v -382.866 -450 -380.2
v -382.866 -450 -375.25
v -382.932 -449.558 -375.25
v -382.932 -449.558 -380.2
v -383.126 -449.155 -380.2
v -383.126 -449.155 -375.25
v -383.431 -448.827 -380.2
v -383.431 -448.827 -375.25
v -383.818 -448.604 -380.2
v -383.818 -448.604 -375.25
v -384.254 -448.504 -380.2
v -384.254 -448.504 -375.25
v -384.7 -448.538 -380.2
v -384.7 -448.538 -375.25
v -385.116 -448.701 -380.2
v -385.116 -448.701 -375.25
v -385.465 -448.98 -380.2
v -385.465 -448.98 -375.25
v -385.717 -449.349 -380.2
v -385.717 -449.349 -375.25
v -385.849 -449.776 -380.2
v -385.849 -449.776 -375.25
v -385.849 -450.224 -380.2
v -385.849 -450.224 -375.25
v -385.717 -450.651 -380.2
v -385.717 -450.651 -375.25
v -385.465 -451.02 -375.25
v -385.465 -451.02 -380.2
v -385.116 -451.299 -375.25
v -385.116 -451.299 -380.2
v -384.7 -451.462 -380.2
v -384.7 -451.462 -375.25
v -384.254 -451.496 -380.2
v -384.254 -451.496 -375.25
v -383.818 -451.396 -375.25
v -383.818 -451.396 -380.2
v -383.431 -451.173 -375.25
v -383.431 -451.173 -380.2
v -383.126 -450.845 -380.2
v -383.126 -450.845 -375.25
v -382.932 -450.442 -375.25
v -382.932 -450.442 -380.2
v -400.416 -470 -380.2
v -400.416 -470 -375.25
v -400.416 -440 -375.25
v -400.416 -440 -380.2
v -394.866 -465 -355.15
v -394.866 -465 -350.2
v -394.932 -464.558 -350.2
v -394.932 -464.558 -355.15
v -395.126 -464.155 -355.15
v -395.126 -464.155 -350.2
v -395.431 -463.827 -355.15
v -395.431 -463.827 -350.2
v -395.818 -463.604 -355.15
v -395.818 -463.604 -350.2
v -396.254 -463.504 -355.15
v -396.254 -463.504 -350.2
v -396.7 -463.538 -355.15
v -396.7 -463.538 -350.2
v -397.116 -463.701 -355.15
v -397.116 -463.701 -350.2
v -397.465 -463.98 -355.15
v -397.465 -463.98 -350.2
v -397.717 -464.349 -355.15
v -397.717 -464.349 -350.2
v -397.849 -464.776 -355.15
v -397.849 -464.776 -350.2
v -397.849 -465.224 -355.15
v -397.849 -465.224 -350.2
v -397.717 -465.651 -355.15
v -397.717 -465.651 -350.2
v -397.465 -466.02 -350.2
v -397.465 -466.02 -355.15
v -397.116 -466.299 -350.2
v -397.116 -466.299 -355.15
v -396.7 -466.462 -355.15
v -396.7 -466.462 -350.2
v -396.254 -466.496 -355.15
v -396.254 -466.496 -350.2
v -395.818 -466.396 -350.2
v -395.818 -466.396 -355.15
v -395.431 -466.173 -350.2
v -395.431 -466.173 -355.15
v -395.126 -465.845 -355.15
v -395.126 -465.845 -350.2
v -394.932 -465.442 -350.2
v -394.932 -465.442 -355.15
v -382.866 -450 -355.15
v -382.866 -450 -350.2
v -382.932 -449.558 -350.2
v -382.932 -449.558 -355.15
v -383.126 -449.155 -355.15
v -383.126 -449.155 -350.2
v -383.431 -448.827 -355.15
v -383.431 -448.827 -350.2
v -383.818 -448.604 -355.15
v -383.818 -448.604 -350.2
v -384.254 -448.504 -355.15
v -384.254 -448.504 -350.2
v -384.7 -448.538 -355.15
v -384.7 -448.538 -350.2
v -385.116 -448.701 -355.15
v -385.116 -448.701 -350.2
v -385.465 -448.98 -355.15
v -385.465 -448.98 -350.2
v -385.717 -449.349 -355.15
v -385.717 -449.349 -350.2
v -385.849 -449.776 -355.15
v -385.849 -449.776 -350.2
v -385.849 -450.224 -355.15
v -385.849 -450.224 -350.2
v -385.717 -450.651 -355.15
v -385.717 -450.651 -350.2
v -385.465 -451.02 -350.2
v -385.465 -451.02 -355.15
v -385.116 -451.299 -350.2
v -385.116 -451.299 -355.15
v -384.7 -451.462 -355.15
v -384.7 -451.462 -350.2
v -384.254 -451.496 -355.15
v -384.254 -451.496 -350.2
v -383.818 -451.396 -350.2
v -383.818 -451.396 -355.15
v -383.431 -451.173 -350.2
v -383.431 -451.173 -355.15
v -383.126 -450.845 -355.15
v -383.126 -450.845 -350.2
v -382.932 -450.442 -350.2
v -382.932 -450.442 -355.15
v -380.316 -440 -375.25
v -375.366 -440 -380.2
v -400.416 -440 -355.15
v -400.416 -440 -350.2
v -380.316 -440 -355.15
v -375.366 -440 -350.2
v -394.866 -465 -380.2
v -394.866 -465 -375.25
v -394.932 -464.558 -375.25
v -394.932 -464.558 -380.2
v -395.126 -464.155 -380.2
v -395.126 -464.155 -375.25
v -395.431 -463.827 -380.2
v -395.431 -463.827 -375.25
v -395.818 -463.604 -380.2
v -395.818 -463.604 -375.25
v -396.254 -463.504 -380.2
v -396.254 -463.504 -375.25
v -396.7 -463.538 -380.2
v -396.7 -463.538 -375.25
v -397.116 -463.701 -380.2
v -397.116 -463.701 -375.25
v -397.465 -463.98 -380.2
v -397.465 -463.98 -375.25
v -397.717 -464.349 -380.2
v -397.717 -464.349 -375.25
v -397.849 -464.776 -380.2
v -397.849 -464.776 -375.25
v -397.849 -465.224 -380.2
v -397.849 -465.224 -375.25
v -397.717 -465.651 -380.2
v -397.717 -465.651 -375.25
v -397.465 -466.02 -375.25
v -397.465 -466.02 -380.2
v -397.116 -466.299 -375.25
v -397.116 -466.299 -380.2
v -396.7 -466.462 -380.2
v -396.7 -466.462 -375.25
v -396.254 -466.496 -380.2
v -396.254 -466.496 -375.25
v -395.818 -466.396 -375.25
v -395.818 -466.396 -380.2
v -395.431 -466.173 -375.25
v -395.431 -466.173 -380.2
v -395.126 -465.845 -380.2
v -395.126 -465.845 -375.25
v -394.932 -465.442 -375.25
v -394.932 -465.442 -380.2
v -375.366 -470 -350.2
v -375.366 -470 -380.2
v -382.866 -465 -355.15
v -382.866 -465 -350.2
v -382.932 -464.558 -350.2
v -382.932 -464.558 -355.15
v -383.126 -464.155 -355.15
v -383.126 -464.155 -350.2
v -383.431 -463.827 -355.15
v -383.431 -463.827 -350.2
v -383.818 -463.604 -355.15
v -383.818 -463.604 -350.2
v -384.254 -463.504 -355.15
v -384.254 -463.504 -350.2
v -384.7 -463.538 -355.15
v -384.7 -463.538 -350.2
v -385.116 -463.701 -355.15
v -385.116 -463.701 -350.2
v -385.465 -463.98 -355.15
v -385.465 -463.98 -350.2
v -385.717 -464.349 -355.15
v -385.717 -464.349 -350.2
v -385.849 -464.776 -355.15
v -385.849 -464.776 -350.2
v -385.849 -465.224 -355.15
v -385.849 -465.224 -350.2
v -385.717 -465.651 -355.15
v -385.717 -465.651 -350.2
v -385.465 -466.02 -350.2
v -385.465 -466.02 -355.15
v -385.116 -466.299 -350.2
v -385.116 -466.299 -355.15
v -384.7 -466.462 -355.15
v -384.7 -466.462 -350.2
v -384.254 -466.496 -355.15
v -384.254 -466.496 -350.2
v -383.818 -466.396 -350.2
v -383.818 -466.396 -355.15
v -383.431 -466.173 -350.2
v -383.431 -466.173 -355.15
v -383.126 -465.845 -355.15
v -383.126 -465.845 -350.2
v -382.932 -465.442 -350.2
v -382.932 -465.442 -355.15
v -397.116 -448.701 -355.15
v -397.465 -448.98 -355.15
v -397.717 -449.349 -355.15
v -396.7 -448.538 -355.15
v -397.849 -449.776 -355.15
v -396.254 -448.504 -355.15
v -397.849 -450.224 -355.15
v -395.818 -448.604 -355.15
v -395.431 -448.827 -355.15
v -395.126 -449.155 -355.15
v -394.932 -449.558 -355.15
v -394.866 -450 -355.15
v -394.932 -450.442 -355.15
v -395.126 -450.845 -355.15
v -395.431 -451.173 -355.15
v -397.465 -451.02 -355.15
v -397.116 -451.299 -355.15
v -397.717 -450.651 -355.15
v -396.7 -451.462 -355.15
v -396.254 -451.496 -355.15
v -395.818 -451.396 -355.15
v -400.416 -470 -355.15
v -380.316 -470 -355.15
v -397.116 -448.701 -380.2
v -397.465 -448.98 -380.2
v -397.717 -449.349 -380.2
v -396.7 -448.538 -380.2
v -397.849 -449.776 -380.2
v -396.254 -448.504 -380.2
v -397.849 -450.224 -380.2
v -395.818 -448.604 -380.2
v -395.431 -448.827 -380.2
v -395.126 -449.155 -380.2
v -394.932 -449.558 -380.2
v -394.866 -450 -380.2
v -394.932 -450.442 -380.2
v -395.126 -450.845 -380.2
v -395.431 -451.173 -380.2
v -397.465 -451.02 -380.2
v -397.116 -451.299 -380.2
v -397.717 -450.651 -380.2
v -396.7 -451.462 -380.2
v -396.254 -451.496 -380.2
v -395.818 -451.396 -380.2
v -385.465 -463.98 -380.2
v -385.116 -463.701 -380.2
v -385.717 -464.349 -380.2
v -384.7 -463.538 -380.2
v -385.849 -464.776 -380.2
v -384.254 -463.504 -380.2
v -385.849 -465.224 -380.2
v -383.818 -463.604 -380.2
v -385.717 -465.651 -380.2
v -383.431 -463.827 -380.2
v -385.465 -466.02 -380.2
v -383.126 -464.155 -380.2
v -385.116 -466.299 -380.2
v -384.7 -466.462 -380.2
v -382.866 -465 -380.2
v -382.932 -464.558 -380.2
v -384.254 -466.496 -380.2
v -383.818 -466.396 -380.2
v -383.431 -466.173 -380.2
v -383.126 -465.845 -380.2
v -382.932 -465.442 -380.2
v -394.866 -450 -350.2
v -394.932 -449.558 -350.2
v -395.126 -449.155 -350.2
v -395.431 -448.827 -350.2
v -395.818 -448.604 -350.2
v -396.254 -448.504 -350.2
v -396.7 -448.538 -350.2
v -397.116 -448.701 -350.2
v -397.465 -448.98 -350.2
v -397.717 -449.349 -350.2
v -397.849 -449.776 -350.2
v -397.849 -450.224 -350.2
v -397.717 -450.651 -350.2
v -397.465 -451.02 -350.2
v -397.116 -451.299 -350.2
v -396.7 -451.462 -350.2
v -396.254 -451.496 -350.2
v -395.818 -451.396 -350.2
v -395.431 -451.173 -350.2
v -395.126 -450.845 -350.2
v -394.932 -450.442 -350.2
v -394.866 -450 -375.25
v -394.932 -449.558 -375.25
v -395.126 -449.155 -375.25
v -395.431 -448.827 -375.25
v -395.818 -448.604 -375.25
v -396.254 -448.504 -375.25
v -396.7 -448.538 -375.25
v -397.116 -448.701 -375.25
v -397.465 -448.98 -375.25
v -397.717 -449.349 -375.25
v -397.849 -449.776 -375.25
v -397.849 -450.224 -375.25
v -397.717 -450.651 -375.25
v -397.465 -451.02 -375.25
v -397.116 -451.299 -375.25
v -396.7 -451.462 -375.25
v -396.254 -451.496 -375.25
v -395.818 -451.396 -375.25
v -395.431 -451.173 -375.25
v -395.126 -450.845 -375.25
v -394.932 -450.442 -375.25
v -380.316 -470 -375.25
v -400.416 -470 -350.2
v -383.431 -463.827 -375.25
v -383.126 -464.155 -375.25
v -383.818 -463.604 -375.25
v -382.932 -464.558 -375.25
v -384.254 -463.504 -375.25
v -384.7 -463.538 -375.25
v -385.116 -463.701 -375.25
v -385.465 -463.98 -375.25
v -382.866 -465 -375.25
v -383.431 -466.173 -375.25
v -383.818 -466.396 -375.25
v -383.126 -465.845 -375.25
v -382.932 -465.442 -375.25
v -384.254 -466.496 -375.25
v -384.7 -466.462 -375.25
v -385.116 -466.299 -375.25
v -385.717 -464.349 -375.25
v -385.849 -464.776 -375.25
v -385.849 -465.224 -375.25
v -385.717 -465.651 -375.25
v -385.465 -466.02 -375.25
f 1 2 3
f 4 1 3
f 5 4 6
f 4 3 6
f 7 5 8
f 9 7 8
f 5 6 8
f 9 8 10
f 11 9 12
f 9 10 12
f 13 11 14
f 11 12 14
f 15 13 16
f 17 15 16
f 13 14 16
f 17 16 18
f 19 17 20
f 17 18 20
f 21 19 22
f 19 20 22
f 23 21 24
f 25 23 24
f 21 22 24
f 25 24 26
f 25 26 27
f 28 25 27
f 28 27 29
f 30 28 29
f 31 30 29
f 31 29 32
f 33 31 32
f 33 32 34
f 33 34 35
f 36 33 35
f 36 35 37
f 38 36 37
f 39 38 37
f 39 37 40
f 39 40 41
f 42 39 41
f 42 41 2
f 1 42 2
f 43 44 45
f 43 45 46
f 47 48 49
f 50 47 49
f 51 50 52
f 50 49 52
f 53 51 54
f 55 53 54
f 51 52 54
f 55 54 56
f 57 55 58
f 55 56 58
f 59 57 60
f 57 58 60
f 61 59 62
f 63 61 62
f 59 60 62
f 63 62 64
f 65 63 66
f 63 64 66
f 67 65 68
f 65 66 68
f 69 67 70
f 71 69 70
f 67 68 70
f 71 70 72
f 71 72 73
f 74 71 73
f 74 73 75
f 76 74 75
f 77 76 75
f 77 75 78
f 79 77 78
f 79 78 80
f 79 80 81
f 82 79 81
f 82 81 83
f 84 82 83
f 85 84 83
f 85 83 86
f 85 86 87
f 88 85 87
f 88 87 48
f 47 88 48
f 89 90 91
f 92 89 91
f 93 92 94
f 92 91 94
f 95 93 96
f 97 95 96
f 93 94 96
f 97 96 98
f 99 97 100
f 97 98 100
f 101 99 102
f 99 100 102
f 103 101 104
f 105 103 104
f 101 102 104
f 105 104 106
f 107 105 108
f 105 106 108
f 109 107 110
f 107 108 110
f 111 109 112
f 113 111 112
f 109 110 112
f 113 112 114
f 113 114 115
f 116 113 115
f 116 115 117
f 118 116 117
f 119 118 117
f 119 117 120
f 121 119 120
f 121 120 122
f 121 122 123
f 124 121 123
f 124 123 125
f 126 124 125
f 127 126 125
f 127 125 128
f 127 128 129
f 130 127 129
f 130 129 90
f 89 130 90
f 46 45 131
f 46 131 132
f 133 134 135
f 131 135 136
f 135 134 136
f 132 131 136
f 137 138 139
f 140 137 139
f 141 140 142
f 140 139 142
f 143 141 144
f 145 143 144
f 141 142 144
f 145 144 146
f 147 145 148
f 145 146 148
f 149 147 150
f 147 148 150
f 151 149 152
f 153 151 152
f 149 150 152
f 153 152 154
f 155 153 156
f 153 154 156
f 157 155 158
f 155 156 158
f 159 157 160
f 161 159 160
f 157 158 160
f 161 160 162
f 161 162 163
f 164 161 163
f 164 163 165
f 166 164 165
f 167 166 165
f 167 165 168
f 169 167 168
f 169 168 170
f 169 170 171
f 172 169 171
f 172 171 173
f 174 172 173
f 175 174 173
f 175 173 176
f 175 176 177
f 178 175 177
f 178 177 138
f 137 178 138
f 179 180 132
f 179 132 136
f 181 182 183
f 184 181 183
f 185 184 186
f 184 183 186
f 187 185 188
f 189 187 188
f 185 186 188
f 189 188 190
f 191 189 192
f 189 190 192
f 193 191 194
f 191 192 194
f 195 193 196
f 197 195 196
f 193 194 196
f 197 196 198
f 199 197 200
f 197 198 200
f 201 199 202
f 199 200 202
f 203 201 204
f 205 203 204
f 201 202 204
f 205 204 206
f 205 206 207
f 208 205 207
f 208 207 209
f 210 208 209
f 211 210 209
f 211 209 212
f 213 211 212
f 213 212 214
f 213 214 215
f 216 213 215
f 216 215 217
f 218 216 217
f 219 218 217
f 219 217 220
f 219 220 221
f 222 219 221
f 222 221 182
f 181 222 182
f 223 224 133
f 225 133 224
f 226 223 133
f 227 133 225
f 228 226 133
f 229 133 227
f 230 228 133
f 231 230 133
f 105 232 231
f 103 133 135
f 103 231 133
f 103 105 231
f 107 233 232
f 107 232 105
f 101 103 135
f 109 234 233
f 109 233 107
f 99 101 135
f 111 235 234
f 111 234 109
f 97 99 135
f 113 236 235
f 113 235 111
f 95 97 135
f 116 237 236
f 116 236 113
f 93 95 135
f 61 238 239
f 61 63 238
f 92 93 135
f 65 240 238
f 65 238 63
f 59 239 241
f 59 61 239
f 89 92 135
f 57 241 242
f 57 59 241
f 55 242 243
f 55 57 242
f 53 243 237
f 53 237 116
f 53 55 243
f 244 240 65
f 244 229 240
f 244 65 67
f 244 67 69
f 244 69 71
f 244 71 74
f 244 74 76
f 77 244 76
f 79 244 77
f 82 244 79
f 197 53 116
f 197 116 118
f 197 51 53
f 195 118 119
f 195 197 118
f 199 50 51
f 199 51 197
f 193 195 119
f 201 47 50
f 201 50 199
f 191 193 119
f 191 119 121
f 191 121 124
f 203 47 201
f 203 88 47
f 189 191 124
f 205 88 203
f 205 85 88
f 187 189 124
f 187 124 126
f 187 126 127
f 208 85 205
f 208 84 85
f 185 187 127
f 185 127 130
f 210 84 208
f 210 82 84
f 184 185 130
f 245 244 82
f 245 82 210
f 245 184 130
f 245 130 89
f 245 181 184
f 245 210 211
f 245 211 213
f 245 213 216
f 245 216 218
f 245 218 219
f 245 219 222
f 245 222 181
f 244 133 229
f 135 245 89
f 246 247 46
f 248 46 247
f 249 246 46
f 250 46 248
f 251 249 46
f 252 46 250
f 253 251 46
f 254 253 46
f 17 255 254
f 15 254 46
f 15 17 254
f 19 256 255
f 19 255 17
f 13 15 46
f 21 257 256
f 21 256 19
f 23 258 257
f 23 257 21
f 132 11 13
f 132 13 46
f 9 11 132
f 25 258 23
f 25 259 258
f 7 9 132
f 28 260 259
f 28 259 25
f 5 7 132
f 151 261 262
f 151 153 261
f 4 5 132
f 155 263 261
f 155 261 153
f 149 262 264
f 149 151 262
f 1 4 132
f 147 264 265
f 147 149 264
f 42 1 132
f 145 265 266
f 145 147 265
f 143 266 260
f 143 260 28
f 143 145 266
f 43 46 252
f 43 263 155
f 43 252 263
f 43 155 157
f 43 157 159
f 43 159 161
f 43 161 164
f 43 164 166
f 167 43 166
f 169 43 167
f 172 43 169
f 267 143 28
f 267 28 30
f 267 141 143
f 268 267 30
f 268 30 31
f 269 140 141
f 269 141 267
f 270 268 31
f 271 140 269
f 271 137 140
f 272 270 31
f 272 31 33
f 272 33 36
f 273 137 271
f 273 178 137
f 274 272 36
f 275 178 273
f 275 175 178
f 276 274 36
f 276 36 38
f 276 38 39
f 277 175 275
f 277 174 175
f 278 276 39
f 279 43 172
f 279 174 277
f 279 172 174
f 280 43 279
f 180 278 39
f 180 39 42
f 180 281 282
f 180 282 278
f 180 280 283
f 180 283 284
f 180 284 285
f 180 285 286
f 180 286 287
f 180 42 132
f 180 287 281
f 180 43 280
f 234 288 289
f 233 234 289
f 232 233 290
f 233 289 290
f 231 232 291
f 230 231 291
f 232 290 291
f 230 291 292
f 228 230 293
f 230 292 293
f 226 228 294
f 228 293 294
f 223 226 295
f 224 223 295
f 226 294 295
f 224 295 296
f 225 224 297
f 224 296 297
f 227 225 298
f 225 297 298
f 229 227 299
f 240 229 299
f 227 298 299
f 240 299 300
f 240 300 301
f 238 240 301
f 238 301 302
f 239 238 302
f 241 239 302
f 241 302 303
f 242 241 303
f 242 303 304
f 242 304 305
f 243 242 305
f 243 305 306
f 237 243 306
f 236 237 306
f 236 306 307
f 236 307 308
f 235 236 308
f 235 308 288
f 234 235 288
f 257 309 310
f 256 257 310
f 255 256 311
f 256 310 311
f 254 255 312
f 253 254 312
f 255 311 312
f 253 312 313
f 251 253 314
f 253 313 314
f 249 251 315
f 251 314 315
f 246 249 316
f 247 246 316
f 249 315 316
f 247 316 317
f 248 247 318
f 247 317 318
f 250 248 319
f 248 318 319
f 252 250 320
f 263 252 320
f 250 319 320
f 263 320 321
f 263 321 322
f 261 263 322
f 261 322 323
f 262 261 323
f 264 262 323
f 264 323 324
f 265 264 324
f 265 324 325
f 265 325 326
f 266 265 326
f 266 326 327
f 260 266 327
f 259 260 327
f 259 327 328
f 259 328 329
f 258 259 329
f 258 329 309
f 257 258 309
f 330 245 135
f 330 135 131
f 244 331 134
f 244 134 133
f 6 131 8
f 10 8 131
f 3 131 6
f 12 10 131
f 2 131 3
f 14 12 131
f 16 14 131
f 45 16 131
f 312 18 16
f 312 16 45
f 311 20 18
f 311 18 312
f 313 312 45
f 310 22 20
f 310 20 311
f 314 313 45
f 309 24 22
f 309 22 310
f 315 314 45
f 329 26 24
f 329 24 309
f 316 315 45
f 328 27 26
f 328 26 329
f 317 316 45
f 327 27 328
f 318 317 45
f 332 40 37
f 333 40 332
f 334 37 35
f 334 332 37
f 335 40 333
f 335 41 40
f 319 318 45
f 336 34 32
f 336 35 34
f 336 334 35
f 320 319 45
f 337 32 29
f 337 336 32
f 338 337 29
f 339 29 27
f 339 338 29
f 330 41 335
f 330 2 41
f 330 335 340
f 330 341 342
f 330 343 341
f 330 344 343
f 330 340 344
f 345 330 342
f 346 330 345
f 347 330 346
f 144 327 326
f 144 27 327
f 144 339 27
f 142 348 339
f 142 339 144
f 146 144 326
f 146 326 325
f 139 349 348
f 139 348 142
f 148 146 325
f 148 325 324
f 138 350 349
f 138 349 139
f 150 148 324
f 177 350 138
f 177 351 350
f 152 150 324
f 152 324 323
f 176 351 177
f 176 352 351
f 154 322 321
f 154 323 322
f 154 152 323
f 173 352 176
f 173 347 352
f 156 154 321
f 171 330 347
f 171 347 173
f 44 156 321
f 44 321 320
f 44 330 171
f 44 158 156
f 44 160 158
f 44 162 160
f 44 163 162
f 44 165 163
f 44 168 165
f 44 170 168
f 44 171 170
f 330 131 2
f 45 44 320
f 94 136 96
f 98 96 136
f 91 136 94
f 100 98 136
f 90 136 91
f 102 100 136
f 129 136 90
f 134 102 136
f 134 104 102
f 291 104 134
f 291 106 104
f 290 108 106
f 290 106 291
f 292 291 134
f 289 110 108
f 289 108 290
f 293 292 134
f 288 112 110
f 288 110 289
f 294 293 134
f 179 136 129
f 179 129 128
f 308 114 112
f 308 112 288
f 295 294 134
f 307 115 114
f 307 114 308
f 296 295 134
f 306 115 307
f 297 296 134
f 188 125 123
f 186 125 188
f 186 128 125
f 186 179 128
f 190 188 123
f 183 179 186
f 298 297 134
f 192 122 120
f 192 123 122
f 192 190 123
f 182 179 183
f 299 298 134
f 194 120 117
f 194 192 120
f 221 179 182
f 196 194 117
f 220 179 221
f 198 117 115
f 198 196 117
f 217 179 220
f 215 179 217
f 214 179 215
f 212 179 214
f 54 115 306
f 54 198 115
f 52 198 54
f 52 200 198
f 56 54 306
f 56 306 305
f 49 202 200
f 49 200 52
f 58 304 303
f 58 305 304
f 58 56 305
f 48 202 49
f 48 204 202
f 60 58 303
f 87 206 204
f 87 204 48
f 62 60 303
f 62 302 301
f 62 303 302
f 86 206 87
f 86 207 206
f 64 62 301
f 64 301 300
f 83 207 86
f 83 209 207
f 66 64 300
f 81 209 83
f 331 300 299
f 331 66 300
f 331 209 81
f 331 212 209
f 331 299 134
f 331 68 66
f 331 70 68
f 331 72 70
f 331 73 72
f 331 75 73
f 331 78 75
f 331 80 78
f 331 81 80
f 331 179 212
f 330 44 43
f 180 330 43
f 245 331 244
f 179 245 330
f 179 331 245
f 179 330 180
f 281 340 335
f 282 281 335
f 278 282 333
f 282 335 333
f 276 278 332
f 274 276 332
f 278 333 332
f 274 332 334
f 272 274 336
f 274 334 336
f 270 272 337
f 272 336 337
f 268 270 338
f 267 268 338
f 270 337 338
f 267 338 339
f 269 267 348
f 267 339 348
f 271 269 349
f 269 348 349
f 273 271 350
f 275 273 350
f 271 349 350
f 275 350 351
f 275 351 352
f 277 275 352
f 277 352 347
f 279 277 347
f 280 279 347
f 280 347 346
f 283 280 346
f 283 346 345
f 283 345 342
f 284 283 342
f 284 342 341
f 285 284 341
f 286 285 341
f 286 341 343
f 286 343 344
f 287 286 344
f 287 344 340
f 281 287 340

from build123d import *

# Parameters (mm, degrees)
EXTRUDE1_DEPTH     = 30
SKETCH3_R          = 1.5
CUT_EXTRUDE1_DEPTH = 30


with BuildPart() as part:
    # Sketch2 → Extrude1 (new body)
    with BuildSketch(Plane.XZ.offset(470)):
        Polygon((-380.315803698, -350.2), (-400.415803698, -350.2), (-400.415803698, -355.15), (-380.315803698, -355.15), (-380.315803698, -375.25), (-400.415803698, -375.25), (-400.415803698, -380.2), (-380.315803698, -380.2), (-375.365803698, -380.2), (-375.365803698, -350.2), align=None)
    extrude(amount=-EXTRUDE1_DEPTH)

    # Sketch3 → Cut-Extrude1 (cut)
    with BuildSketch(Plane.XY.offset(-350.2)):
        with Locations((-384.365803698, -465)):
            Circle(SKETCH3_R)
        with Locations((-396.365803698, -465)):
            Circle(SKETCH3_R)
        with Locations((-384.365803698, -450)):
            Circle(SKETCH3_R)
        with Locations((-396.365803698, -450)):
            Circle(SKETCH3_R)
    extrude(amount=-CUT_EXTRUDE1_DEPTH, mode=Mode.SUBTRACT)


solid = part.part
